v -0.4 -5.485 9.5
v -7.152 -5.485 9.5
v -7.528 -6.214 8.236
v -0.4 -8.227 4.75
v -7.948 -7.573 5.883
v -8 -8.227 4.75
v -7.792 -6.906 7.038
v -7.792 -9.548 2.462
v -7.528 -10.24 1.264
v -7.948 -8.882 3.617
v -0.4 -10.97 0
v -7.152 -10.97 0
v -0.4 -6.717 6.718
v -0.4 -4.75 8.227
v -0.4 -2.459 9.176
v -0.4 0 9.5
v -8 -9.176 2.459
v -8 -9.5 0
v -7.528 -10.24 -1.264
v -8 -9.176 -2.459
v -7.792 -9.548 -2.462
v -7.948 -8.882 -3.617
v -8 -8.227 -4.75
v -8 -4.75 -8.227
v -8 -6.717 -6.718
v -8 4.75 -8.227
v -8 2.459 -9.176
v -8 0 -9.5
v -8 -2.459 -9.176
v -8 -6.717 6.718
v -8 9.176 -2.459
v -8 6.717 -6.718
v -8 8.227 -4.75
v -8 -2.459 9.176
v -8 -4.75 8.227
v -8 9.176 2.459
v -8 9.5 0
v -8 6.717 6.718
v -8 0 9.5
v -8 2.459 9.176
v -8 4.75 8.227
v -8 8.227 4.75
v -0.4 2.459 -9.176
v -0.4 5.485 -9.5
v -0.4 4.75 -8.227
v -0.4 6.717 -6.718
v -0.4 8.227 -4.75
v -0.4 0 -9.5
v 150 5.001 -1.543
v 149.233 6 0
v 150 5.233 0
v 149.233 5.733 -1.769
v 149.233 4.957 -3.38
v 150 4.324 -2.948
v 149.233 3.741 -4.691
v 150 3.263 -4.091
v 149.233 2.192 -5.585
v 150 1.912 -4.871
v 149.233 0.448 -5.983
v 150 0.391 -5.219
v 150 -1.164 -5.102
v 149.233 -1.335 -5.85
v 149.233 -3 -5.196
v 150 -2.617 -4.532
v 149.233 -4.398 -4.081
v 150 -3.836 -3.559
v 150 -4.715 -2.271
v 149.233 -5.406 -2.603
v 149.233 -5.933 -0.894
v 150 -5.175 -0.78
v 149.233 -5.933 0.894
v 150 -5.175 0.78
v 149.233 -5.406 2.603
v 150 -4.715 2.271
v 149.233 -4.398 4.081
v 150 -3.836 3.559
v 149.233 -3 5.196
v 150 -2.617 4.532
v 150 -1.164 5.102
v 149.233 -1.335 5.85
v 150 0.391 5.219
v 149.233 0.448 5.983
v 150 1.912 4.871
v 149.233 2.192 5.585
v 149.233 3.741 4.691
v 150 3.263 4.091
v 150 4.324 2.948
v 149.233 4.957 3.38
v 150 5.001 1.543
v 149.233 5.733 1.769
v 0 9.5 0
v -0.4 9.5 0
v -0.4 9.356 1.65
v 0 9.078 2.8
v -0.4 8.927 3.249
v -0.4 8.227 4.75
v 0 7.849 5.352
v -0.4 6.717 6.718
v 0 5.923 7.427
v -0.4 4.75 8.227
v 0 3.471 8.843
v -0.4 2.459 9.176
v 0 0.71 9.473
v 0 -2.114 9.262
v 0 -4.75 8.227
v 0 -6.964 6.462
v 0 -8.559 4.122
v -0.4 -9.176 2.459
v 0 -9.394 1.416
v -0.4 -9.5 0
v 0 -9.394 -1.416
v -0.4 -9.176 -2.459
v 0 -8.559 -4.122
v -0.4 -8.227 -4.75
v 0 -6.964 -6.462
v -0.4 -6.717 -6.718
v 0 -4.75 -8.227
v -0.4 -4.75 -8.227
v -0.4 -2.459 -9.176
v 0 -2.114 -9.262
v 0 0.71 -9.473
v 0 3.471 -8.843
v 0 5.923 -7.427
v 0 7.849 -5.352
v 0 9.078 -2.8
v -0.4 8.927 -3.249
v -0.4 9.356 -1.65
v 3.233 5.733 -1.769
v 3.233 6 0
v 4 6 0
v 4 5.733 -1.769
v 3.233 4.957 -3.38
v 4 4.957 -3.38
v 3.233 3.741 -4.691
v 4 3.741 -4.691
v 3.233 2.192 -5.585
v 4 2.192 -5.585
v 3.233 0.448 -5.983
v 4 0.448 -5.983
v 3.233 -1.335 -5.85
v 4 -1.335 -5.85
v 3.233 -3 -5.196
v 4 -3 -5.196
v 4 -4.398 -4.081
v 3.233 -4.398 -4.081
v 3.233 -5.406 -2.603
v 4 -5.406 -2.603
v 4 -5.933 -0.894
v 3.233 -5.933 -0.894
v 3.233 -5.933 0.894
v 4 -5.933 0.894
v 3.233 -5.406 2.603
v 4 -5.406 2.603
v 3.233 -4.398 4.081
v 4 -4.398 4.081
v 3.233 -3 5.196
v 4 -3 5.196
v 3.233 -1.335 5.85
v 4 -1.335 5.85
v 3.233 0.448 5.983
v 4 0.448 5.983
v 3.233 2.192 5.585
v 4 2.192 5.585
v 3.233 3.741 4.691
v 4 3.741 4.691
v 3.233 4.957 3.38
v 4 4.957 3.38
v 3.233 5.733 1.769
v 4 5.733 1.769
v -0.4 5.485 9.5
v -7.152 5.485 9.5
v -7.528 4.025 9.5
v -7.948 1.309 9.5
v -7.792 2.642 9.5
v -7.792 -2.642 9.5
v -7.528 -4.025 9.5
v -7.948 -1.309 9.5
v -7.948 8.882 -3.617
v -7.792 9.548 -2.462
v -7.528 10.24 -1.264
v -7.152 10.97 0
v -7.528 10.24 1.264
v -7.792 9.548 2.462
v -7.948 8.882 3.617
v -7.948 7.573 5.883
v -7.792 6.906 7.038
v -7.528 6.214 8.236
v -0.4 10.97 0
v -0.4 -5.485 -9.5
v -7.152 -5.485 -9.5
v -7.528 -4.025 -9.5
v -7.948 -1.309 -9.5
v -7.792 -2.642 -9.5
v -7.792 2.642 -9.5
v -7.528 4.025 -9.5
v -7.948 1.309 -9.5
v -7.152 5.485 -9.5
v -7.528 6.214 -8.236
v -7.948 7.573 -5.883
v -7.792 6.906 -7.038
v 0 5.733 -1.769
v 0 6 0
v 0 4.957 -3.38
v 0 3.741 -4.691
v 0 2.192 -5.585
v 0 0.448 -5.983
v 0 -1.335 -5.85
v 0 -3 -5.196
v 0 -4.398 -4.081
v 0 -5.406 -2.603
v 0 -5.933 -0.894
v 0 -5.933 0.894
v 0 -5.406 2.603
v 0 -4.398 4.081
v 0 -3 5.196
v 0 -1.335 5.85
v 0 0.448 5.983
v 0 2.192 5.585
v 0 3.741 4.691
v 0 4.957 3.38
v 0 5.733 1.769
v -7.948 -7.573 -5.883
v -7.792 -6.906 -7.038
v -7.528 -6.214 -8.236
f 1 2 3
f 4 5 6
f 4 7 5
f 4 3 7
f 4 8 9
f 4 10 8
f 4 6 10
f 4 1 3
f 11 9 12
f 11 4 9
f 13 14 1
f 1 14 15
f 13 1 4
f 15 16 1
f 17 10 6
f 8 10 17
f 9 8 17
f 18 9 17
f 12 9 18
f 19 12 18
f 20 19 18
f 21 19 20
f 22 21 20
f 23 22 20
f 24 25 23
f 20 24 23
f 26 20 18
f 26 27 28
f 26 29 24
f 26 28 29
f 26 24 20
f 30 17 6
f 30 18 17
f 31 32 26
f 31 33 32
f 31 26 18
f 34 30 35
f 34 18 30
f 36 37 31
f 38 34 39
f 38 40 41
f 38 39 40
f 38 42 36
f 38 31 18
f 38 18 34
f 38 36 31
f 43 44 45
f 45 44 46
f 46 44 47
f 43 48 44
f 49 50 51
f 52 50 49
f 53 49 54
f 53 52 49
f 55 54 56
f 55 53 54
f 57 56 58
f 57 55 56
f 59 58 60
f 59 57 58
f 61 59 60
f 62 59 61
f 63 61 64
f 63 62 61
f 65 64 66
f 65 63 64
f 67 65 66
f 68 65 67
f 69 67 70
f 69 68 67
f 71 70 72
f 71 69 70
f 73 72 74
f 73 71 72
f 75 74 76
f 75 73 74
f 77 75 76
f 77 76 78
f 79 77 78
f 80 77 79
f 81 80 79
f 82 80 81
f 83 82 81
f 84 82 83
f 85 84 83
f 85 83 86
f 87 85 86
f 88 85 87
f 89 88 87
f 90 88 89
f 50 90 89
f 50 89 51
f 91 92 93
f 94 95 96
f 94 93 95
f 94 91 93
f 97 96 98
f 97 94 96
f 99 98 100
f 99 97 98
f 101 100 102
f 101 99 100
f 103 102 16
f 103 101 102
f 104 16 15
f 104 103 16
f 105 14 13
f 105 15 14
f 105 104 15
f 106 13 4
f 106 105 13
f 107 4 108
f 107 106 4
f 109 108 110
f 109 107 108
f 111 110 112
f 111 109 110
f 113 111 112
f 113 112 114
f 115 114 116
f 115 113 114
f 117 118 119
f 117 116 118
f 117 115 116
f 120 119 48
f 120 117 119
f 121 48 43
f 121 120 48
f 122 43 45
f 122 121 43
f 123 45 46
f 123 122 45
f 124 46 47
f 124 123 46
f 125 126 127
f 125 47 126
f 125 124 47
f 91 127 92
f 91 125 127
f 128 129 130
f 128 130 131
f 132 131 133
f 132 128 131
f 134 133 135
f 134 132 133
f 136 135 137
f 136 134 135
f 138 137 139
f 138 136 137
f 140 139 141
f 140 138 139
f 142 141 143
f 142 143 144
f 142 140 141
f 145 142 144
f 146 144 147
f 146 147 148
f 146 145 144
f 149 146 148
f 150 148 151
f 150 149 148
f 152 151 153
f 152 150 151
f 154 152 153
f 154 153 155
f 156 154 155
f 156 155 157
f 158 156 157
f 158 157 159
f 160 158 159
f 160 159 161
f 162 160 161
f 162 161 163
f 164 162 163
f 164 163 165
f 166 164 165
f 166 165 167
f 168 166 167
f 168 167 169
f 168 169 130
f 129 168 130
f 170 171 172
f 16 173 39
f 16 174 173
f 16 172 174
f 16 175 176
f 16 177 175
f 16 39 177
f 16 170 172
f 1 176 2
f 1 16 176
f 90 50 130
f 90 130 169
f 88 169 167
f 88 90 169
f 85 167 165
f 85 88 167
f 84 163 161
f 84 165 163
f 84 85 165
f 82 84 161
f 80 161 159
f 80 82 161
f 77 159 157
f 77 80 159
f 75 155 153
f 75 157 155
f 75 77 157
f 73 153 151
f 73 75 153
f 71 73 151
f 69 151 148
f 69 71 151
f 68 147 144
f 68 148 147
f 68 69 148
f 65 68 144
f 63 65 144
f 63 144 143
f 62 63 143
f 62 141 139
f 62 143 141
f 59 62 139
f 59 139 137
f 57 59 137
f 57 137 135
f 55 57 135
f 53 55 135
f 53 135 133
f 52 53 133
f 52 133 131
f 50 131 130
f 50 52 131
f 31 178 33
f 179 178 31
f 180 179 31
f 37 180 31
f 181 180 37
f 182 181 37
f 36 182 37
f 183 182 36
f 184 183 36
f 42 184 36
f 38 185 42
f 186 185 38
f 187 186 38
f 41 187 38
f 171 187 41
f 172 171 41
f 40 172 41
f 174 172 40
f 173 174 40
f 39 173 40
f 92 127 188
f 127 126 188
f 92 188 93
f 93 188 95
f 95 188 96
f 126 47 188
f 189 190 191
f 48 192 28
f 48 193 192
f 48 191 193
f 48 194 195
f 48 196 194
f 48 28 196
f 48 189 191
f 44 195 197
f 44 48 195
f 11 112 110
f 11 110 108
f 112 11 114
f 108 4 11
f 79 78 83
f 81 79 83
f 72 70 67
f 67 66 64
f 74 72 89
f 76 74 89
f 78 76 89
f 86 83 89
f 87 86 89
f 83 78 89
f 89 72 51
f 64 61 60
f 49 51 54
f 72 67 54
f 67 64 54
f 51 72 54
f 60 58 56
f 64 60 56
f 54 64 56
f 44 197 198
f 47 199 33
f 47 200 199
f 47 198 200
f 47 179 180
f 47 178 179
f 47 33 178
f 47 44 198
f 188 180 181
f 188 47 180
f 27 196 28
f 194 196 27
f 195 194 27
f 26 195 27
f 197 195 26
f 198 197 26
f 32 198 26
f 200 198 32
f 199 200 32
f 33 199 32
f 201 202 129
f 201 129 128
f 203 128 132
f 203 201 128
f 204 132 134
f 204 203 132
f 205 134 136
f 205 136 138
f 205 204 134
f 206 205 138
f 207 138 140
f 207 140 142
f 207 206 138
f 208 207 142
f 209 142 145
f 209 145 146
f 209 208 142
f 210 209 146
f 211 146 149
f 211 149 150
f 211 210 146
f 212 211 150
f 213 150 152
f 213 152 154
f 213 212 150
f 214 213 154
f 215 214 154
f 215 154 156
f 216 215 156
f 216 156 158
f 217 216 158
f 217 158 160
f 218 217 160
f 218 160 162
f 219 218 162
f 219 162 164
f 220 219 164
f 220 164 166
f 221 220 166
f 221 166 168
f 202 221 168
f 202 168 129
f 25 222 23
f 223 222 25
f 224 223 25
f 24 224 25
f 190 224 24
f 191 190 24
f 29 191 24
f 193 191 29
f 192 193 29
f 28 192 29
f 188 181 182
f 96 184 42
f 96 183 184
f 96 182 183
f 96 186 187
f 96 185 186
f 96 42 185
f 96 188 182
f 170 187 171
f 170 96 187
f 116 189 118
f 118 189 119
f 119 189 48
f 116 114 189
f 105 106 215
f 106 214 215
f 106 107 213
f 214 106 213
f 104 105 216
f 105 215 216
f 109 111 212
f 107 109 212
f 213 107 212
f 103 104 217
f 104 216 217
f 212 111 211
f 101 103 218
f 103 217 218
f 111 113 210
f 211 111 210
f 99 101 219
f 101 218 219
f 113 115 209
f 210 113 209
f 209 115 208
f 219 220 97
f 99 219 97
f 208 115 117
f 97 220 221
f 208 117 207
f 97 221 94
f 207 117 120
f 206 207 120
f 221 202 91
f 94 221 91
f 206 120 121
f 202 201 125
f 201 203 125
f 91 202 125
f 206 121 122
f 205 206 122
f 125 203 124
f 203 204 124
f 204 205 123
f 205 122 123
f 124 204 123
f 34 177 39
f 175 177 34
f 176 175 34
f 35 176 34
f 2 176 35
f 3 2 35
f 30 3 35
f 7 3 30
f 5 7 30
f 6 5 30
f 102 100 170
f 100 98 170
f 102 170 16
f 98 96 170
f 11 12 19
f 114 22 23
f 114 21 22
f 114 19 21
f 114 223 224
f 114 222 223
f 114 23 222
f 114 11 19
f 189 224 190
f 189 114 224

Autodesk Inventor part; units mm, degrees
ref_plane "YZ Plane" through (0, 0, 0) normal (1, 0, 0) x (0, 1, 0)
ref_plane "XZ Plane" through (0, 0, 0) normal (0, 1, 0) x (-1, 0, 0)
sketch "Sketch1" plane through (0, 0, 0) normal (0, 0, 1) x (1, 0, 0)
  line L0 (0, 9.5) -> (0, 6)
  line L1 (4, 6) -> (150, 6)
  line L2 (150, 6) -> (150, 0)
  line L3 (150, 0) -> (-0.4001, 0)
  line L4 (-30.4801, 0) -> (180.08, 0) projected
  line L5 (-0.4001, 0) -> (-0.4001, 9.5)
  line L6 (-0.4001, 9.5) -> (0, 9.5)
  line L7 (4, 6) -> (3.2331, 6)
  line L8 (3.2331, 6) -> (0, 6)
  line L9 (0, -1.9) -> (0, 11.4) projected
  dimension "d0" = 150
  dimension "d1" = 146
  dimension "d2" = 12
  dimension "d9" = 0.4001
  dimension "d10" = 19
  dimension "d13" = 0.7669
  dimension "d14" = 12
revolve "Body" add sketch "Sketch1" angle 360 about axis through (150, 0, 0) along (-1, 0, 0)
sketch "Sketch2" plane through (-0.4001, 0, 0) normal (-1, 0, 0) x (0, 0, 1)
  line L0 (0, 10.9697) -> (9.5, 5.4848)
  line L1 (9.5, 5.4848) -> (9.5, -5.4848)
  line L2 (9.5, -5.4848) -> (0, -10.9697)
  line L3 (0, -10.9697) -> (-9.5, -5.4848)
  line L4 (-9.5, -5.4848) -> (-9.5, 5.4848)
  line L5 (-9.5, 5.4848) -> (0, 10.9697)
  point P0 (0, 0)
  point P1 (0, 0)
  dimension "d11" = 19
extrude "Head" add sketch "Sketch2" along normal blind 7.6
sketch "Sketch4" plane through (0, 0, 0) normal (0, 0, 1) x (1, 0, 0)
  line L0 (-8.0001, 9.5) -> (-8.0001, 10.9697)
  line L1 (-8.0001, 10.9697) -> (-7.1516, 10.9697)
  line L2 (-7.1516, 10.9697) -> (-8.0001, 9.5)
  line L3 (-9.5201, 0) -> (1.1199, 0) projected
  line L4 (-0.4001, 10.9697) -> (-8.0001, 10.9697) projected
  line L5 (-8.0001, 5.4848) -> (-8.0001, 10.9697) projected
  dimension "d5" = 30
  dimension "d19" = 19
revolve "Chamfer1" cut sketch "Sketch4" angle 360 about axis through (-10, 0, 0) along (1, 0, 0)
thread "Thread" size "M12x1.25" class "6g" standard "ISO Metric profile" length 146
chamfer "Chamfer2" distance 0.7668 distance2 0.7669 1 edges at (150, -6, 0) measured on face at (150, -1.326, -0.0818)
ref_plane "Work Plane1" through (1.525, 0, 0) normal (0, 0, 1) x (1, 0, 0)
equation "\"d0\" = NLG"
equation "\"d1\" = GEL"
equation "\"d2\" = GD"
equation "\"d10\" = SD2"
equation "\"d14\" = BDM"
equation "\"d11\" = SW"
equation "\"d3\" = KOH - SD"
equation "\"d5\" = ANG1"
equation "\"d19\" = SW0"
equation "\"d15\" = GEL"
equation "\"d6\" = -0.5 * SPD + 0.5 * GD"
equation "\"NLG\" = 150"
equation "\"GD\" = NND"
equation "\"BDM\" = NND"
equation "\"KOH\" = 8"
equation "\"GEL\" = 146"
equation "\"SW\" = 19"
equation "\"SW0\" = SW"
equation "\"SPD\" = NND - 1.2269 * PTC"
equation "\"SD2\" = SW"
equation "\"SD\" = WFT"
equation "\"ANG1\" = 30deg"
equation "\"GAL\" = 0.61345 * PTC"
equation "\"GUL\" = 0.61345 * PTC"
equation "\"RR\" = 0.6"
equation "\"WFT\" = 0.4"
equation "\"GD1\" = THREADDIA - 1.2269 * PTC"
equation "\"THREADDIA\" = 12"
equation "\"SDH\" = SW"
equation "\"TOA\" = 30deg"
equation "\"PTC\" = 1.25"
equation "\"NND\" = 12"
equation "\"E0\" = 1.155 * SW"
properties part number "CNS 4321 - M12 x 150" material "Steel, Mild"
